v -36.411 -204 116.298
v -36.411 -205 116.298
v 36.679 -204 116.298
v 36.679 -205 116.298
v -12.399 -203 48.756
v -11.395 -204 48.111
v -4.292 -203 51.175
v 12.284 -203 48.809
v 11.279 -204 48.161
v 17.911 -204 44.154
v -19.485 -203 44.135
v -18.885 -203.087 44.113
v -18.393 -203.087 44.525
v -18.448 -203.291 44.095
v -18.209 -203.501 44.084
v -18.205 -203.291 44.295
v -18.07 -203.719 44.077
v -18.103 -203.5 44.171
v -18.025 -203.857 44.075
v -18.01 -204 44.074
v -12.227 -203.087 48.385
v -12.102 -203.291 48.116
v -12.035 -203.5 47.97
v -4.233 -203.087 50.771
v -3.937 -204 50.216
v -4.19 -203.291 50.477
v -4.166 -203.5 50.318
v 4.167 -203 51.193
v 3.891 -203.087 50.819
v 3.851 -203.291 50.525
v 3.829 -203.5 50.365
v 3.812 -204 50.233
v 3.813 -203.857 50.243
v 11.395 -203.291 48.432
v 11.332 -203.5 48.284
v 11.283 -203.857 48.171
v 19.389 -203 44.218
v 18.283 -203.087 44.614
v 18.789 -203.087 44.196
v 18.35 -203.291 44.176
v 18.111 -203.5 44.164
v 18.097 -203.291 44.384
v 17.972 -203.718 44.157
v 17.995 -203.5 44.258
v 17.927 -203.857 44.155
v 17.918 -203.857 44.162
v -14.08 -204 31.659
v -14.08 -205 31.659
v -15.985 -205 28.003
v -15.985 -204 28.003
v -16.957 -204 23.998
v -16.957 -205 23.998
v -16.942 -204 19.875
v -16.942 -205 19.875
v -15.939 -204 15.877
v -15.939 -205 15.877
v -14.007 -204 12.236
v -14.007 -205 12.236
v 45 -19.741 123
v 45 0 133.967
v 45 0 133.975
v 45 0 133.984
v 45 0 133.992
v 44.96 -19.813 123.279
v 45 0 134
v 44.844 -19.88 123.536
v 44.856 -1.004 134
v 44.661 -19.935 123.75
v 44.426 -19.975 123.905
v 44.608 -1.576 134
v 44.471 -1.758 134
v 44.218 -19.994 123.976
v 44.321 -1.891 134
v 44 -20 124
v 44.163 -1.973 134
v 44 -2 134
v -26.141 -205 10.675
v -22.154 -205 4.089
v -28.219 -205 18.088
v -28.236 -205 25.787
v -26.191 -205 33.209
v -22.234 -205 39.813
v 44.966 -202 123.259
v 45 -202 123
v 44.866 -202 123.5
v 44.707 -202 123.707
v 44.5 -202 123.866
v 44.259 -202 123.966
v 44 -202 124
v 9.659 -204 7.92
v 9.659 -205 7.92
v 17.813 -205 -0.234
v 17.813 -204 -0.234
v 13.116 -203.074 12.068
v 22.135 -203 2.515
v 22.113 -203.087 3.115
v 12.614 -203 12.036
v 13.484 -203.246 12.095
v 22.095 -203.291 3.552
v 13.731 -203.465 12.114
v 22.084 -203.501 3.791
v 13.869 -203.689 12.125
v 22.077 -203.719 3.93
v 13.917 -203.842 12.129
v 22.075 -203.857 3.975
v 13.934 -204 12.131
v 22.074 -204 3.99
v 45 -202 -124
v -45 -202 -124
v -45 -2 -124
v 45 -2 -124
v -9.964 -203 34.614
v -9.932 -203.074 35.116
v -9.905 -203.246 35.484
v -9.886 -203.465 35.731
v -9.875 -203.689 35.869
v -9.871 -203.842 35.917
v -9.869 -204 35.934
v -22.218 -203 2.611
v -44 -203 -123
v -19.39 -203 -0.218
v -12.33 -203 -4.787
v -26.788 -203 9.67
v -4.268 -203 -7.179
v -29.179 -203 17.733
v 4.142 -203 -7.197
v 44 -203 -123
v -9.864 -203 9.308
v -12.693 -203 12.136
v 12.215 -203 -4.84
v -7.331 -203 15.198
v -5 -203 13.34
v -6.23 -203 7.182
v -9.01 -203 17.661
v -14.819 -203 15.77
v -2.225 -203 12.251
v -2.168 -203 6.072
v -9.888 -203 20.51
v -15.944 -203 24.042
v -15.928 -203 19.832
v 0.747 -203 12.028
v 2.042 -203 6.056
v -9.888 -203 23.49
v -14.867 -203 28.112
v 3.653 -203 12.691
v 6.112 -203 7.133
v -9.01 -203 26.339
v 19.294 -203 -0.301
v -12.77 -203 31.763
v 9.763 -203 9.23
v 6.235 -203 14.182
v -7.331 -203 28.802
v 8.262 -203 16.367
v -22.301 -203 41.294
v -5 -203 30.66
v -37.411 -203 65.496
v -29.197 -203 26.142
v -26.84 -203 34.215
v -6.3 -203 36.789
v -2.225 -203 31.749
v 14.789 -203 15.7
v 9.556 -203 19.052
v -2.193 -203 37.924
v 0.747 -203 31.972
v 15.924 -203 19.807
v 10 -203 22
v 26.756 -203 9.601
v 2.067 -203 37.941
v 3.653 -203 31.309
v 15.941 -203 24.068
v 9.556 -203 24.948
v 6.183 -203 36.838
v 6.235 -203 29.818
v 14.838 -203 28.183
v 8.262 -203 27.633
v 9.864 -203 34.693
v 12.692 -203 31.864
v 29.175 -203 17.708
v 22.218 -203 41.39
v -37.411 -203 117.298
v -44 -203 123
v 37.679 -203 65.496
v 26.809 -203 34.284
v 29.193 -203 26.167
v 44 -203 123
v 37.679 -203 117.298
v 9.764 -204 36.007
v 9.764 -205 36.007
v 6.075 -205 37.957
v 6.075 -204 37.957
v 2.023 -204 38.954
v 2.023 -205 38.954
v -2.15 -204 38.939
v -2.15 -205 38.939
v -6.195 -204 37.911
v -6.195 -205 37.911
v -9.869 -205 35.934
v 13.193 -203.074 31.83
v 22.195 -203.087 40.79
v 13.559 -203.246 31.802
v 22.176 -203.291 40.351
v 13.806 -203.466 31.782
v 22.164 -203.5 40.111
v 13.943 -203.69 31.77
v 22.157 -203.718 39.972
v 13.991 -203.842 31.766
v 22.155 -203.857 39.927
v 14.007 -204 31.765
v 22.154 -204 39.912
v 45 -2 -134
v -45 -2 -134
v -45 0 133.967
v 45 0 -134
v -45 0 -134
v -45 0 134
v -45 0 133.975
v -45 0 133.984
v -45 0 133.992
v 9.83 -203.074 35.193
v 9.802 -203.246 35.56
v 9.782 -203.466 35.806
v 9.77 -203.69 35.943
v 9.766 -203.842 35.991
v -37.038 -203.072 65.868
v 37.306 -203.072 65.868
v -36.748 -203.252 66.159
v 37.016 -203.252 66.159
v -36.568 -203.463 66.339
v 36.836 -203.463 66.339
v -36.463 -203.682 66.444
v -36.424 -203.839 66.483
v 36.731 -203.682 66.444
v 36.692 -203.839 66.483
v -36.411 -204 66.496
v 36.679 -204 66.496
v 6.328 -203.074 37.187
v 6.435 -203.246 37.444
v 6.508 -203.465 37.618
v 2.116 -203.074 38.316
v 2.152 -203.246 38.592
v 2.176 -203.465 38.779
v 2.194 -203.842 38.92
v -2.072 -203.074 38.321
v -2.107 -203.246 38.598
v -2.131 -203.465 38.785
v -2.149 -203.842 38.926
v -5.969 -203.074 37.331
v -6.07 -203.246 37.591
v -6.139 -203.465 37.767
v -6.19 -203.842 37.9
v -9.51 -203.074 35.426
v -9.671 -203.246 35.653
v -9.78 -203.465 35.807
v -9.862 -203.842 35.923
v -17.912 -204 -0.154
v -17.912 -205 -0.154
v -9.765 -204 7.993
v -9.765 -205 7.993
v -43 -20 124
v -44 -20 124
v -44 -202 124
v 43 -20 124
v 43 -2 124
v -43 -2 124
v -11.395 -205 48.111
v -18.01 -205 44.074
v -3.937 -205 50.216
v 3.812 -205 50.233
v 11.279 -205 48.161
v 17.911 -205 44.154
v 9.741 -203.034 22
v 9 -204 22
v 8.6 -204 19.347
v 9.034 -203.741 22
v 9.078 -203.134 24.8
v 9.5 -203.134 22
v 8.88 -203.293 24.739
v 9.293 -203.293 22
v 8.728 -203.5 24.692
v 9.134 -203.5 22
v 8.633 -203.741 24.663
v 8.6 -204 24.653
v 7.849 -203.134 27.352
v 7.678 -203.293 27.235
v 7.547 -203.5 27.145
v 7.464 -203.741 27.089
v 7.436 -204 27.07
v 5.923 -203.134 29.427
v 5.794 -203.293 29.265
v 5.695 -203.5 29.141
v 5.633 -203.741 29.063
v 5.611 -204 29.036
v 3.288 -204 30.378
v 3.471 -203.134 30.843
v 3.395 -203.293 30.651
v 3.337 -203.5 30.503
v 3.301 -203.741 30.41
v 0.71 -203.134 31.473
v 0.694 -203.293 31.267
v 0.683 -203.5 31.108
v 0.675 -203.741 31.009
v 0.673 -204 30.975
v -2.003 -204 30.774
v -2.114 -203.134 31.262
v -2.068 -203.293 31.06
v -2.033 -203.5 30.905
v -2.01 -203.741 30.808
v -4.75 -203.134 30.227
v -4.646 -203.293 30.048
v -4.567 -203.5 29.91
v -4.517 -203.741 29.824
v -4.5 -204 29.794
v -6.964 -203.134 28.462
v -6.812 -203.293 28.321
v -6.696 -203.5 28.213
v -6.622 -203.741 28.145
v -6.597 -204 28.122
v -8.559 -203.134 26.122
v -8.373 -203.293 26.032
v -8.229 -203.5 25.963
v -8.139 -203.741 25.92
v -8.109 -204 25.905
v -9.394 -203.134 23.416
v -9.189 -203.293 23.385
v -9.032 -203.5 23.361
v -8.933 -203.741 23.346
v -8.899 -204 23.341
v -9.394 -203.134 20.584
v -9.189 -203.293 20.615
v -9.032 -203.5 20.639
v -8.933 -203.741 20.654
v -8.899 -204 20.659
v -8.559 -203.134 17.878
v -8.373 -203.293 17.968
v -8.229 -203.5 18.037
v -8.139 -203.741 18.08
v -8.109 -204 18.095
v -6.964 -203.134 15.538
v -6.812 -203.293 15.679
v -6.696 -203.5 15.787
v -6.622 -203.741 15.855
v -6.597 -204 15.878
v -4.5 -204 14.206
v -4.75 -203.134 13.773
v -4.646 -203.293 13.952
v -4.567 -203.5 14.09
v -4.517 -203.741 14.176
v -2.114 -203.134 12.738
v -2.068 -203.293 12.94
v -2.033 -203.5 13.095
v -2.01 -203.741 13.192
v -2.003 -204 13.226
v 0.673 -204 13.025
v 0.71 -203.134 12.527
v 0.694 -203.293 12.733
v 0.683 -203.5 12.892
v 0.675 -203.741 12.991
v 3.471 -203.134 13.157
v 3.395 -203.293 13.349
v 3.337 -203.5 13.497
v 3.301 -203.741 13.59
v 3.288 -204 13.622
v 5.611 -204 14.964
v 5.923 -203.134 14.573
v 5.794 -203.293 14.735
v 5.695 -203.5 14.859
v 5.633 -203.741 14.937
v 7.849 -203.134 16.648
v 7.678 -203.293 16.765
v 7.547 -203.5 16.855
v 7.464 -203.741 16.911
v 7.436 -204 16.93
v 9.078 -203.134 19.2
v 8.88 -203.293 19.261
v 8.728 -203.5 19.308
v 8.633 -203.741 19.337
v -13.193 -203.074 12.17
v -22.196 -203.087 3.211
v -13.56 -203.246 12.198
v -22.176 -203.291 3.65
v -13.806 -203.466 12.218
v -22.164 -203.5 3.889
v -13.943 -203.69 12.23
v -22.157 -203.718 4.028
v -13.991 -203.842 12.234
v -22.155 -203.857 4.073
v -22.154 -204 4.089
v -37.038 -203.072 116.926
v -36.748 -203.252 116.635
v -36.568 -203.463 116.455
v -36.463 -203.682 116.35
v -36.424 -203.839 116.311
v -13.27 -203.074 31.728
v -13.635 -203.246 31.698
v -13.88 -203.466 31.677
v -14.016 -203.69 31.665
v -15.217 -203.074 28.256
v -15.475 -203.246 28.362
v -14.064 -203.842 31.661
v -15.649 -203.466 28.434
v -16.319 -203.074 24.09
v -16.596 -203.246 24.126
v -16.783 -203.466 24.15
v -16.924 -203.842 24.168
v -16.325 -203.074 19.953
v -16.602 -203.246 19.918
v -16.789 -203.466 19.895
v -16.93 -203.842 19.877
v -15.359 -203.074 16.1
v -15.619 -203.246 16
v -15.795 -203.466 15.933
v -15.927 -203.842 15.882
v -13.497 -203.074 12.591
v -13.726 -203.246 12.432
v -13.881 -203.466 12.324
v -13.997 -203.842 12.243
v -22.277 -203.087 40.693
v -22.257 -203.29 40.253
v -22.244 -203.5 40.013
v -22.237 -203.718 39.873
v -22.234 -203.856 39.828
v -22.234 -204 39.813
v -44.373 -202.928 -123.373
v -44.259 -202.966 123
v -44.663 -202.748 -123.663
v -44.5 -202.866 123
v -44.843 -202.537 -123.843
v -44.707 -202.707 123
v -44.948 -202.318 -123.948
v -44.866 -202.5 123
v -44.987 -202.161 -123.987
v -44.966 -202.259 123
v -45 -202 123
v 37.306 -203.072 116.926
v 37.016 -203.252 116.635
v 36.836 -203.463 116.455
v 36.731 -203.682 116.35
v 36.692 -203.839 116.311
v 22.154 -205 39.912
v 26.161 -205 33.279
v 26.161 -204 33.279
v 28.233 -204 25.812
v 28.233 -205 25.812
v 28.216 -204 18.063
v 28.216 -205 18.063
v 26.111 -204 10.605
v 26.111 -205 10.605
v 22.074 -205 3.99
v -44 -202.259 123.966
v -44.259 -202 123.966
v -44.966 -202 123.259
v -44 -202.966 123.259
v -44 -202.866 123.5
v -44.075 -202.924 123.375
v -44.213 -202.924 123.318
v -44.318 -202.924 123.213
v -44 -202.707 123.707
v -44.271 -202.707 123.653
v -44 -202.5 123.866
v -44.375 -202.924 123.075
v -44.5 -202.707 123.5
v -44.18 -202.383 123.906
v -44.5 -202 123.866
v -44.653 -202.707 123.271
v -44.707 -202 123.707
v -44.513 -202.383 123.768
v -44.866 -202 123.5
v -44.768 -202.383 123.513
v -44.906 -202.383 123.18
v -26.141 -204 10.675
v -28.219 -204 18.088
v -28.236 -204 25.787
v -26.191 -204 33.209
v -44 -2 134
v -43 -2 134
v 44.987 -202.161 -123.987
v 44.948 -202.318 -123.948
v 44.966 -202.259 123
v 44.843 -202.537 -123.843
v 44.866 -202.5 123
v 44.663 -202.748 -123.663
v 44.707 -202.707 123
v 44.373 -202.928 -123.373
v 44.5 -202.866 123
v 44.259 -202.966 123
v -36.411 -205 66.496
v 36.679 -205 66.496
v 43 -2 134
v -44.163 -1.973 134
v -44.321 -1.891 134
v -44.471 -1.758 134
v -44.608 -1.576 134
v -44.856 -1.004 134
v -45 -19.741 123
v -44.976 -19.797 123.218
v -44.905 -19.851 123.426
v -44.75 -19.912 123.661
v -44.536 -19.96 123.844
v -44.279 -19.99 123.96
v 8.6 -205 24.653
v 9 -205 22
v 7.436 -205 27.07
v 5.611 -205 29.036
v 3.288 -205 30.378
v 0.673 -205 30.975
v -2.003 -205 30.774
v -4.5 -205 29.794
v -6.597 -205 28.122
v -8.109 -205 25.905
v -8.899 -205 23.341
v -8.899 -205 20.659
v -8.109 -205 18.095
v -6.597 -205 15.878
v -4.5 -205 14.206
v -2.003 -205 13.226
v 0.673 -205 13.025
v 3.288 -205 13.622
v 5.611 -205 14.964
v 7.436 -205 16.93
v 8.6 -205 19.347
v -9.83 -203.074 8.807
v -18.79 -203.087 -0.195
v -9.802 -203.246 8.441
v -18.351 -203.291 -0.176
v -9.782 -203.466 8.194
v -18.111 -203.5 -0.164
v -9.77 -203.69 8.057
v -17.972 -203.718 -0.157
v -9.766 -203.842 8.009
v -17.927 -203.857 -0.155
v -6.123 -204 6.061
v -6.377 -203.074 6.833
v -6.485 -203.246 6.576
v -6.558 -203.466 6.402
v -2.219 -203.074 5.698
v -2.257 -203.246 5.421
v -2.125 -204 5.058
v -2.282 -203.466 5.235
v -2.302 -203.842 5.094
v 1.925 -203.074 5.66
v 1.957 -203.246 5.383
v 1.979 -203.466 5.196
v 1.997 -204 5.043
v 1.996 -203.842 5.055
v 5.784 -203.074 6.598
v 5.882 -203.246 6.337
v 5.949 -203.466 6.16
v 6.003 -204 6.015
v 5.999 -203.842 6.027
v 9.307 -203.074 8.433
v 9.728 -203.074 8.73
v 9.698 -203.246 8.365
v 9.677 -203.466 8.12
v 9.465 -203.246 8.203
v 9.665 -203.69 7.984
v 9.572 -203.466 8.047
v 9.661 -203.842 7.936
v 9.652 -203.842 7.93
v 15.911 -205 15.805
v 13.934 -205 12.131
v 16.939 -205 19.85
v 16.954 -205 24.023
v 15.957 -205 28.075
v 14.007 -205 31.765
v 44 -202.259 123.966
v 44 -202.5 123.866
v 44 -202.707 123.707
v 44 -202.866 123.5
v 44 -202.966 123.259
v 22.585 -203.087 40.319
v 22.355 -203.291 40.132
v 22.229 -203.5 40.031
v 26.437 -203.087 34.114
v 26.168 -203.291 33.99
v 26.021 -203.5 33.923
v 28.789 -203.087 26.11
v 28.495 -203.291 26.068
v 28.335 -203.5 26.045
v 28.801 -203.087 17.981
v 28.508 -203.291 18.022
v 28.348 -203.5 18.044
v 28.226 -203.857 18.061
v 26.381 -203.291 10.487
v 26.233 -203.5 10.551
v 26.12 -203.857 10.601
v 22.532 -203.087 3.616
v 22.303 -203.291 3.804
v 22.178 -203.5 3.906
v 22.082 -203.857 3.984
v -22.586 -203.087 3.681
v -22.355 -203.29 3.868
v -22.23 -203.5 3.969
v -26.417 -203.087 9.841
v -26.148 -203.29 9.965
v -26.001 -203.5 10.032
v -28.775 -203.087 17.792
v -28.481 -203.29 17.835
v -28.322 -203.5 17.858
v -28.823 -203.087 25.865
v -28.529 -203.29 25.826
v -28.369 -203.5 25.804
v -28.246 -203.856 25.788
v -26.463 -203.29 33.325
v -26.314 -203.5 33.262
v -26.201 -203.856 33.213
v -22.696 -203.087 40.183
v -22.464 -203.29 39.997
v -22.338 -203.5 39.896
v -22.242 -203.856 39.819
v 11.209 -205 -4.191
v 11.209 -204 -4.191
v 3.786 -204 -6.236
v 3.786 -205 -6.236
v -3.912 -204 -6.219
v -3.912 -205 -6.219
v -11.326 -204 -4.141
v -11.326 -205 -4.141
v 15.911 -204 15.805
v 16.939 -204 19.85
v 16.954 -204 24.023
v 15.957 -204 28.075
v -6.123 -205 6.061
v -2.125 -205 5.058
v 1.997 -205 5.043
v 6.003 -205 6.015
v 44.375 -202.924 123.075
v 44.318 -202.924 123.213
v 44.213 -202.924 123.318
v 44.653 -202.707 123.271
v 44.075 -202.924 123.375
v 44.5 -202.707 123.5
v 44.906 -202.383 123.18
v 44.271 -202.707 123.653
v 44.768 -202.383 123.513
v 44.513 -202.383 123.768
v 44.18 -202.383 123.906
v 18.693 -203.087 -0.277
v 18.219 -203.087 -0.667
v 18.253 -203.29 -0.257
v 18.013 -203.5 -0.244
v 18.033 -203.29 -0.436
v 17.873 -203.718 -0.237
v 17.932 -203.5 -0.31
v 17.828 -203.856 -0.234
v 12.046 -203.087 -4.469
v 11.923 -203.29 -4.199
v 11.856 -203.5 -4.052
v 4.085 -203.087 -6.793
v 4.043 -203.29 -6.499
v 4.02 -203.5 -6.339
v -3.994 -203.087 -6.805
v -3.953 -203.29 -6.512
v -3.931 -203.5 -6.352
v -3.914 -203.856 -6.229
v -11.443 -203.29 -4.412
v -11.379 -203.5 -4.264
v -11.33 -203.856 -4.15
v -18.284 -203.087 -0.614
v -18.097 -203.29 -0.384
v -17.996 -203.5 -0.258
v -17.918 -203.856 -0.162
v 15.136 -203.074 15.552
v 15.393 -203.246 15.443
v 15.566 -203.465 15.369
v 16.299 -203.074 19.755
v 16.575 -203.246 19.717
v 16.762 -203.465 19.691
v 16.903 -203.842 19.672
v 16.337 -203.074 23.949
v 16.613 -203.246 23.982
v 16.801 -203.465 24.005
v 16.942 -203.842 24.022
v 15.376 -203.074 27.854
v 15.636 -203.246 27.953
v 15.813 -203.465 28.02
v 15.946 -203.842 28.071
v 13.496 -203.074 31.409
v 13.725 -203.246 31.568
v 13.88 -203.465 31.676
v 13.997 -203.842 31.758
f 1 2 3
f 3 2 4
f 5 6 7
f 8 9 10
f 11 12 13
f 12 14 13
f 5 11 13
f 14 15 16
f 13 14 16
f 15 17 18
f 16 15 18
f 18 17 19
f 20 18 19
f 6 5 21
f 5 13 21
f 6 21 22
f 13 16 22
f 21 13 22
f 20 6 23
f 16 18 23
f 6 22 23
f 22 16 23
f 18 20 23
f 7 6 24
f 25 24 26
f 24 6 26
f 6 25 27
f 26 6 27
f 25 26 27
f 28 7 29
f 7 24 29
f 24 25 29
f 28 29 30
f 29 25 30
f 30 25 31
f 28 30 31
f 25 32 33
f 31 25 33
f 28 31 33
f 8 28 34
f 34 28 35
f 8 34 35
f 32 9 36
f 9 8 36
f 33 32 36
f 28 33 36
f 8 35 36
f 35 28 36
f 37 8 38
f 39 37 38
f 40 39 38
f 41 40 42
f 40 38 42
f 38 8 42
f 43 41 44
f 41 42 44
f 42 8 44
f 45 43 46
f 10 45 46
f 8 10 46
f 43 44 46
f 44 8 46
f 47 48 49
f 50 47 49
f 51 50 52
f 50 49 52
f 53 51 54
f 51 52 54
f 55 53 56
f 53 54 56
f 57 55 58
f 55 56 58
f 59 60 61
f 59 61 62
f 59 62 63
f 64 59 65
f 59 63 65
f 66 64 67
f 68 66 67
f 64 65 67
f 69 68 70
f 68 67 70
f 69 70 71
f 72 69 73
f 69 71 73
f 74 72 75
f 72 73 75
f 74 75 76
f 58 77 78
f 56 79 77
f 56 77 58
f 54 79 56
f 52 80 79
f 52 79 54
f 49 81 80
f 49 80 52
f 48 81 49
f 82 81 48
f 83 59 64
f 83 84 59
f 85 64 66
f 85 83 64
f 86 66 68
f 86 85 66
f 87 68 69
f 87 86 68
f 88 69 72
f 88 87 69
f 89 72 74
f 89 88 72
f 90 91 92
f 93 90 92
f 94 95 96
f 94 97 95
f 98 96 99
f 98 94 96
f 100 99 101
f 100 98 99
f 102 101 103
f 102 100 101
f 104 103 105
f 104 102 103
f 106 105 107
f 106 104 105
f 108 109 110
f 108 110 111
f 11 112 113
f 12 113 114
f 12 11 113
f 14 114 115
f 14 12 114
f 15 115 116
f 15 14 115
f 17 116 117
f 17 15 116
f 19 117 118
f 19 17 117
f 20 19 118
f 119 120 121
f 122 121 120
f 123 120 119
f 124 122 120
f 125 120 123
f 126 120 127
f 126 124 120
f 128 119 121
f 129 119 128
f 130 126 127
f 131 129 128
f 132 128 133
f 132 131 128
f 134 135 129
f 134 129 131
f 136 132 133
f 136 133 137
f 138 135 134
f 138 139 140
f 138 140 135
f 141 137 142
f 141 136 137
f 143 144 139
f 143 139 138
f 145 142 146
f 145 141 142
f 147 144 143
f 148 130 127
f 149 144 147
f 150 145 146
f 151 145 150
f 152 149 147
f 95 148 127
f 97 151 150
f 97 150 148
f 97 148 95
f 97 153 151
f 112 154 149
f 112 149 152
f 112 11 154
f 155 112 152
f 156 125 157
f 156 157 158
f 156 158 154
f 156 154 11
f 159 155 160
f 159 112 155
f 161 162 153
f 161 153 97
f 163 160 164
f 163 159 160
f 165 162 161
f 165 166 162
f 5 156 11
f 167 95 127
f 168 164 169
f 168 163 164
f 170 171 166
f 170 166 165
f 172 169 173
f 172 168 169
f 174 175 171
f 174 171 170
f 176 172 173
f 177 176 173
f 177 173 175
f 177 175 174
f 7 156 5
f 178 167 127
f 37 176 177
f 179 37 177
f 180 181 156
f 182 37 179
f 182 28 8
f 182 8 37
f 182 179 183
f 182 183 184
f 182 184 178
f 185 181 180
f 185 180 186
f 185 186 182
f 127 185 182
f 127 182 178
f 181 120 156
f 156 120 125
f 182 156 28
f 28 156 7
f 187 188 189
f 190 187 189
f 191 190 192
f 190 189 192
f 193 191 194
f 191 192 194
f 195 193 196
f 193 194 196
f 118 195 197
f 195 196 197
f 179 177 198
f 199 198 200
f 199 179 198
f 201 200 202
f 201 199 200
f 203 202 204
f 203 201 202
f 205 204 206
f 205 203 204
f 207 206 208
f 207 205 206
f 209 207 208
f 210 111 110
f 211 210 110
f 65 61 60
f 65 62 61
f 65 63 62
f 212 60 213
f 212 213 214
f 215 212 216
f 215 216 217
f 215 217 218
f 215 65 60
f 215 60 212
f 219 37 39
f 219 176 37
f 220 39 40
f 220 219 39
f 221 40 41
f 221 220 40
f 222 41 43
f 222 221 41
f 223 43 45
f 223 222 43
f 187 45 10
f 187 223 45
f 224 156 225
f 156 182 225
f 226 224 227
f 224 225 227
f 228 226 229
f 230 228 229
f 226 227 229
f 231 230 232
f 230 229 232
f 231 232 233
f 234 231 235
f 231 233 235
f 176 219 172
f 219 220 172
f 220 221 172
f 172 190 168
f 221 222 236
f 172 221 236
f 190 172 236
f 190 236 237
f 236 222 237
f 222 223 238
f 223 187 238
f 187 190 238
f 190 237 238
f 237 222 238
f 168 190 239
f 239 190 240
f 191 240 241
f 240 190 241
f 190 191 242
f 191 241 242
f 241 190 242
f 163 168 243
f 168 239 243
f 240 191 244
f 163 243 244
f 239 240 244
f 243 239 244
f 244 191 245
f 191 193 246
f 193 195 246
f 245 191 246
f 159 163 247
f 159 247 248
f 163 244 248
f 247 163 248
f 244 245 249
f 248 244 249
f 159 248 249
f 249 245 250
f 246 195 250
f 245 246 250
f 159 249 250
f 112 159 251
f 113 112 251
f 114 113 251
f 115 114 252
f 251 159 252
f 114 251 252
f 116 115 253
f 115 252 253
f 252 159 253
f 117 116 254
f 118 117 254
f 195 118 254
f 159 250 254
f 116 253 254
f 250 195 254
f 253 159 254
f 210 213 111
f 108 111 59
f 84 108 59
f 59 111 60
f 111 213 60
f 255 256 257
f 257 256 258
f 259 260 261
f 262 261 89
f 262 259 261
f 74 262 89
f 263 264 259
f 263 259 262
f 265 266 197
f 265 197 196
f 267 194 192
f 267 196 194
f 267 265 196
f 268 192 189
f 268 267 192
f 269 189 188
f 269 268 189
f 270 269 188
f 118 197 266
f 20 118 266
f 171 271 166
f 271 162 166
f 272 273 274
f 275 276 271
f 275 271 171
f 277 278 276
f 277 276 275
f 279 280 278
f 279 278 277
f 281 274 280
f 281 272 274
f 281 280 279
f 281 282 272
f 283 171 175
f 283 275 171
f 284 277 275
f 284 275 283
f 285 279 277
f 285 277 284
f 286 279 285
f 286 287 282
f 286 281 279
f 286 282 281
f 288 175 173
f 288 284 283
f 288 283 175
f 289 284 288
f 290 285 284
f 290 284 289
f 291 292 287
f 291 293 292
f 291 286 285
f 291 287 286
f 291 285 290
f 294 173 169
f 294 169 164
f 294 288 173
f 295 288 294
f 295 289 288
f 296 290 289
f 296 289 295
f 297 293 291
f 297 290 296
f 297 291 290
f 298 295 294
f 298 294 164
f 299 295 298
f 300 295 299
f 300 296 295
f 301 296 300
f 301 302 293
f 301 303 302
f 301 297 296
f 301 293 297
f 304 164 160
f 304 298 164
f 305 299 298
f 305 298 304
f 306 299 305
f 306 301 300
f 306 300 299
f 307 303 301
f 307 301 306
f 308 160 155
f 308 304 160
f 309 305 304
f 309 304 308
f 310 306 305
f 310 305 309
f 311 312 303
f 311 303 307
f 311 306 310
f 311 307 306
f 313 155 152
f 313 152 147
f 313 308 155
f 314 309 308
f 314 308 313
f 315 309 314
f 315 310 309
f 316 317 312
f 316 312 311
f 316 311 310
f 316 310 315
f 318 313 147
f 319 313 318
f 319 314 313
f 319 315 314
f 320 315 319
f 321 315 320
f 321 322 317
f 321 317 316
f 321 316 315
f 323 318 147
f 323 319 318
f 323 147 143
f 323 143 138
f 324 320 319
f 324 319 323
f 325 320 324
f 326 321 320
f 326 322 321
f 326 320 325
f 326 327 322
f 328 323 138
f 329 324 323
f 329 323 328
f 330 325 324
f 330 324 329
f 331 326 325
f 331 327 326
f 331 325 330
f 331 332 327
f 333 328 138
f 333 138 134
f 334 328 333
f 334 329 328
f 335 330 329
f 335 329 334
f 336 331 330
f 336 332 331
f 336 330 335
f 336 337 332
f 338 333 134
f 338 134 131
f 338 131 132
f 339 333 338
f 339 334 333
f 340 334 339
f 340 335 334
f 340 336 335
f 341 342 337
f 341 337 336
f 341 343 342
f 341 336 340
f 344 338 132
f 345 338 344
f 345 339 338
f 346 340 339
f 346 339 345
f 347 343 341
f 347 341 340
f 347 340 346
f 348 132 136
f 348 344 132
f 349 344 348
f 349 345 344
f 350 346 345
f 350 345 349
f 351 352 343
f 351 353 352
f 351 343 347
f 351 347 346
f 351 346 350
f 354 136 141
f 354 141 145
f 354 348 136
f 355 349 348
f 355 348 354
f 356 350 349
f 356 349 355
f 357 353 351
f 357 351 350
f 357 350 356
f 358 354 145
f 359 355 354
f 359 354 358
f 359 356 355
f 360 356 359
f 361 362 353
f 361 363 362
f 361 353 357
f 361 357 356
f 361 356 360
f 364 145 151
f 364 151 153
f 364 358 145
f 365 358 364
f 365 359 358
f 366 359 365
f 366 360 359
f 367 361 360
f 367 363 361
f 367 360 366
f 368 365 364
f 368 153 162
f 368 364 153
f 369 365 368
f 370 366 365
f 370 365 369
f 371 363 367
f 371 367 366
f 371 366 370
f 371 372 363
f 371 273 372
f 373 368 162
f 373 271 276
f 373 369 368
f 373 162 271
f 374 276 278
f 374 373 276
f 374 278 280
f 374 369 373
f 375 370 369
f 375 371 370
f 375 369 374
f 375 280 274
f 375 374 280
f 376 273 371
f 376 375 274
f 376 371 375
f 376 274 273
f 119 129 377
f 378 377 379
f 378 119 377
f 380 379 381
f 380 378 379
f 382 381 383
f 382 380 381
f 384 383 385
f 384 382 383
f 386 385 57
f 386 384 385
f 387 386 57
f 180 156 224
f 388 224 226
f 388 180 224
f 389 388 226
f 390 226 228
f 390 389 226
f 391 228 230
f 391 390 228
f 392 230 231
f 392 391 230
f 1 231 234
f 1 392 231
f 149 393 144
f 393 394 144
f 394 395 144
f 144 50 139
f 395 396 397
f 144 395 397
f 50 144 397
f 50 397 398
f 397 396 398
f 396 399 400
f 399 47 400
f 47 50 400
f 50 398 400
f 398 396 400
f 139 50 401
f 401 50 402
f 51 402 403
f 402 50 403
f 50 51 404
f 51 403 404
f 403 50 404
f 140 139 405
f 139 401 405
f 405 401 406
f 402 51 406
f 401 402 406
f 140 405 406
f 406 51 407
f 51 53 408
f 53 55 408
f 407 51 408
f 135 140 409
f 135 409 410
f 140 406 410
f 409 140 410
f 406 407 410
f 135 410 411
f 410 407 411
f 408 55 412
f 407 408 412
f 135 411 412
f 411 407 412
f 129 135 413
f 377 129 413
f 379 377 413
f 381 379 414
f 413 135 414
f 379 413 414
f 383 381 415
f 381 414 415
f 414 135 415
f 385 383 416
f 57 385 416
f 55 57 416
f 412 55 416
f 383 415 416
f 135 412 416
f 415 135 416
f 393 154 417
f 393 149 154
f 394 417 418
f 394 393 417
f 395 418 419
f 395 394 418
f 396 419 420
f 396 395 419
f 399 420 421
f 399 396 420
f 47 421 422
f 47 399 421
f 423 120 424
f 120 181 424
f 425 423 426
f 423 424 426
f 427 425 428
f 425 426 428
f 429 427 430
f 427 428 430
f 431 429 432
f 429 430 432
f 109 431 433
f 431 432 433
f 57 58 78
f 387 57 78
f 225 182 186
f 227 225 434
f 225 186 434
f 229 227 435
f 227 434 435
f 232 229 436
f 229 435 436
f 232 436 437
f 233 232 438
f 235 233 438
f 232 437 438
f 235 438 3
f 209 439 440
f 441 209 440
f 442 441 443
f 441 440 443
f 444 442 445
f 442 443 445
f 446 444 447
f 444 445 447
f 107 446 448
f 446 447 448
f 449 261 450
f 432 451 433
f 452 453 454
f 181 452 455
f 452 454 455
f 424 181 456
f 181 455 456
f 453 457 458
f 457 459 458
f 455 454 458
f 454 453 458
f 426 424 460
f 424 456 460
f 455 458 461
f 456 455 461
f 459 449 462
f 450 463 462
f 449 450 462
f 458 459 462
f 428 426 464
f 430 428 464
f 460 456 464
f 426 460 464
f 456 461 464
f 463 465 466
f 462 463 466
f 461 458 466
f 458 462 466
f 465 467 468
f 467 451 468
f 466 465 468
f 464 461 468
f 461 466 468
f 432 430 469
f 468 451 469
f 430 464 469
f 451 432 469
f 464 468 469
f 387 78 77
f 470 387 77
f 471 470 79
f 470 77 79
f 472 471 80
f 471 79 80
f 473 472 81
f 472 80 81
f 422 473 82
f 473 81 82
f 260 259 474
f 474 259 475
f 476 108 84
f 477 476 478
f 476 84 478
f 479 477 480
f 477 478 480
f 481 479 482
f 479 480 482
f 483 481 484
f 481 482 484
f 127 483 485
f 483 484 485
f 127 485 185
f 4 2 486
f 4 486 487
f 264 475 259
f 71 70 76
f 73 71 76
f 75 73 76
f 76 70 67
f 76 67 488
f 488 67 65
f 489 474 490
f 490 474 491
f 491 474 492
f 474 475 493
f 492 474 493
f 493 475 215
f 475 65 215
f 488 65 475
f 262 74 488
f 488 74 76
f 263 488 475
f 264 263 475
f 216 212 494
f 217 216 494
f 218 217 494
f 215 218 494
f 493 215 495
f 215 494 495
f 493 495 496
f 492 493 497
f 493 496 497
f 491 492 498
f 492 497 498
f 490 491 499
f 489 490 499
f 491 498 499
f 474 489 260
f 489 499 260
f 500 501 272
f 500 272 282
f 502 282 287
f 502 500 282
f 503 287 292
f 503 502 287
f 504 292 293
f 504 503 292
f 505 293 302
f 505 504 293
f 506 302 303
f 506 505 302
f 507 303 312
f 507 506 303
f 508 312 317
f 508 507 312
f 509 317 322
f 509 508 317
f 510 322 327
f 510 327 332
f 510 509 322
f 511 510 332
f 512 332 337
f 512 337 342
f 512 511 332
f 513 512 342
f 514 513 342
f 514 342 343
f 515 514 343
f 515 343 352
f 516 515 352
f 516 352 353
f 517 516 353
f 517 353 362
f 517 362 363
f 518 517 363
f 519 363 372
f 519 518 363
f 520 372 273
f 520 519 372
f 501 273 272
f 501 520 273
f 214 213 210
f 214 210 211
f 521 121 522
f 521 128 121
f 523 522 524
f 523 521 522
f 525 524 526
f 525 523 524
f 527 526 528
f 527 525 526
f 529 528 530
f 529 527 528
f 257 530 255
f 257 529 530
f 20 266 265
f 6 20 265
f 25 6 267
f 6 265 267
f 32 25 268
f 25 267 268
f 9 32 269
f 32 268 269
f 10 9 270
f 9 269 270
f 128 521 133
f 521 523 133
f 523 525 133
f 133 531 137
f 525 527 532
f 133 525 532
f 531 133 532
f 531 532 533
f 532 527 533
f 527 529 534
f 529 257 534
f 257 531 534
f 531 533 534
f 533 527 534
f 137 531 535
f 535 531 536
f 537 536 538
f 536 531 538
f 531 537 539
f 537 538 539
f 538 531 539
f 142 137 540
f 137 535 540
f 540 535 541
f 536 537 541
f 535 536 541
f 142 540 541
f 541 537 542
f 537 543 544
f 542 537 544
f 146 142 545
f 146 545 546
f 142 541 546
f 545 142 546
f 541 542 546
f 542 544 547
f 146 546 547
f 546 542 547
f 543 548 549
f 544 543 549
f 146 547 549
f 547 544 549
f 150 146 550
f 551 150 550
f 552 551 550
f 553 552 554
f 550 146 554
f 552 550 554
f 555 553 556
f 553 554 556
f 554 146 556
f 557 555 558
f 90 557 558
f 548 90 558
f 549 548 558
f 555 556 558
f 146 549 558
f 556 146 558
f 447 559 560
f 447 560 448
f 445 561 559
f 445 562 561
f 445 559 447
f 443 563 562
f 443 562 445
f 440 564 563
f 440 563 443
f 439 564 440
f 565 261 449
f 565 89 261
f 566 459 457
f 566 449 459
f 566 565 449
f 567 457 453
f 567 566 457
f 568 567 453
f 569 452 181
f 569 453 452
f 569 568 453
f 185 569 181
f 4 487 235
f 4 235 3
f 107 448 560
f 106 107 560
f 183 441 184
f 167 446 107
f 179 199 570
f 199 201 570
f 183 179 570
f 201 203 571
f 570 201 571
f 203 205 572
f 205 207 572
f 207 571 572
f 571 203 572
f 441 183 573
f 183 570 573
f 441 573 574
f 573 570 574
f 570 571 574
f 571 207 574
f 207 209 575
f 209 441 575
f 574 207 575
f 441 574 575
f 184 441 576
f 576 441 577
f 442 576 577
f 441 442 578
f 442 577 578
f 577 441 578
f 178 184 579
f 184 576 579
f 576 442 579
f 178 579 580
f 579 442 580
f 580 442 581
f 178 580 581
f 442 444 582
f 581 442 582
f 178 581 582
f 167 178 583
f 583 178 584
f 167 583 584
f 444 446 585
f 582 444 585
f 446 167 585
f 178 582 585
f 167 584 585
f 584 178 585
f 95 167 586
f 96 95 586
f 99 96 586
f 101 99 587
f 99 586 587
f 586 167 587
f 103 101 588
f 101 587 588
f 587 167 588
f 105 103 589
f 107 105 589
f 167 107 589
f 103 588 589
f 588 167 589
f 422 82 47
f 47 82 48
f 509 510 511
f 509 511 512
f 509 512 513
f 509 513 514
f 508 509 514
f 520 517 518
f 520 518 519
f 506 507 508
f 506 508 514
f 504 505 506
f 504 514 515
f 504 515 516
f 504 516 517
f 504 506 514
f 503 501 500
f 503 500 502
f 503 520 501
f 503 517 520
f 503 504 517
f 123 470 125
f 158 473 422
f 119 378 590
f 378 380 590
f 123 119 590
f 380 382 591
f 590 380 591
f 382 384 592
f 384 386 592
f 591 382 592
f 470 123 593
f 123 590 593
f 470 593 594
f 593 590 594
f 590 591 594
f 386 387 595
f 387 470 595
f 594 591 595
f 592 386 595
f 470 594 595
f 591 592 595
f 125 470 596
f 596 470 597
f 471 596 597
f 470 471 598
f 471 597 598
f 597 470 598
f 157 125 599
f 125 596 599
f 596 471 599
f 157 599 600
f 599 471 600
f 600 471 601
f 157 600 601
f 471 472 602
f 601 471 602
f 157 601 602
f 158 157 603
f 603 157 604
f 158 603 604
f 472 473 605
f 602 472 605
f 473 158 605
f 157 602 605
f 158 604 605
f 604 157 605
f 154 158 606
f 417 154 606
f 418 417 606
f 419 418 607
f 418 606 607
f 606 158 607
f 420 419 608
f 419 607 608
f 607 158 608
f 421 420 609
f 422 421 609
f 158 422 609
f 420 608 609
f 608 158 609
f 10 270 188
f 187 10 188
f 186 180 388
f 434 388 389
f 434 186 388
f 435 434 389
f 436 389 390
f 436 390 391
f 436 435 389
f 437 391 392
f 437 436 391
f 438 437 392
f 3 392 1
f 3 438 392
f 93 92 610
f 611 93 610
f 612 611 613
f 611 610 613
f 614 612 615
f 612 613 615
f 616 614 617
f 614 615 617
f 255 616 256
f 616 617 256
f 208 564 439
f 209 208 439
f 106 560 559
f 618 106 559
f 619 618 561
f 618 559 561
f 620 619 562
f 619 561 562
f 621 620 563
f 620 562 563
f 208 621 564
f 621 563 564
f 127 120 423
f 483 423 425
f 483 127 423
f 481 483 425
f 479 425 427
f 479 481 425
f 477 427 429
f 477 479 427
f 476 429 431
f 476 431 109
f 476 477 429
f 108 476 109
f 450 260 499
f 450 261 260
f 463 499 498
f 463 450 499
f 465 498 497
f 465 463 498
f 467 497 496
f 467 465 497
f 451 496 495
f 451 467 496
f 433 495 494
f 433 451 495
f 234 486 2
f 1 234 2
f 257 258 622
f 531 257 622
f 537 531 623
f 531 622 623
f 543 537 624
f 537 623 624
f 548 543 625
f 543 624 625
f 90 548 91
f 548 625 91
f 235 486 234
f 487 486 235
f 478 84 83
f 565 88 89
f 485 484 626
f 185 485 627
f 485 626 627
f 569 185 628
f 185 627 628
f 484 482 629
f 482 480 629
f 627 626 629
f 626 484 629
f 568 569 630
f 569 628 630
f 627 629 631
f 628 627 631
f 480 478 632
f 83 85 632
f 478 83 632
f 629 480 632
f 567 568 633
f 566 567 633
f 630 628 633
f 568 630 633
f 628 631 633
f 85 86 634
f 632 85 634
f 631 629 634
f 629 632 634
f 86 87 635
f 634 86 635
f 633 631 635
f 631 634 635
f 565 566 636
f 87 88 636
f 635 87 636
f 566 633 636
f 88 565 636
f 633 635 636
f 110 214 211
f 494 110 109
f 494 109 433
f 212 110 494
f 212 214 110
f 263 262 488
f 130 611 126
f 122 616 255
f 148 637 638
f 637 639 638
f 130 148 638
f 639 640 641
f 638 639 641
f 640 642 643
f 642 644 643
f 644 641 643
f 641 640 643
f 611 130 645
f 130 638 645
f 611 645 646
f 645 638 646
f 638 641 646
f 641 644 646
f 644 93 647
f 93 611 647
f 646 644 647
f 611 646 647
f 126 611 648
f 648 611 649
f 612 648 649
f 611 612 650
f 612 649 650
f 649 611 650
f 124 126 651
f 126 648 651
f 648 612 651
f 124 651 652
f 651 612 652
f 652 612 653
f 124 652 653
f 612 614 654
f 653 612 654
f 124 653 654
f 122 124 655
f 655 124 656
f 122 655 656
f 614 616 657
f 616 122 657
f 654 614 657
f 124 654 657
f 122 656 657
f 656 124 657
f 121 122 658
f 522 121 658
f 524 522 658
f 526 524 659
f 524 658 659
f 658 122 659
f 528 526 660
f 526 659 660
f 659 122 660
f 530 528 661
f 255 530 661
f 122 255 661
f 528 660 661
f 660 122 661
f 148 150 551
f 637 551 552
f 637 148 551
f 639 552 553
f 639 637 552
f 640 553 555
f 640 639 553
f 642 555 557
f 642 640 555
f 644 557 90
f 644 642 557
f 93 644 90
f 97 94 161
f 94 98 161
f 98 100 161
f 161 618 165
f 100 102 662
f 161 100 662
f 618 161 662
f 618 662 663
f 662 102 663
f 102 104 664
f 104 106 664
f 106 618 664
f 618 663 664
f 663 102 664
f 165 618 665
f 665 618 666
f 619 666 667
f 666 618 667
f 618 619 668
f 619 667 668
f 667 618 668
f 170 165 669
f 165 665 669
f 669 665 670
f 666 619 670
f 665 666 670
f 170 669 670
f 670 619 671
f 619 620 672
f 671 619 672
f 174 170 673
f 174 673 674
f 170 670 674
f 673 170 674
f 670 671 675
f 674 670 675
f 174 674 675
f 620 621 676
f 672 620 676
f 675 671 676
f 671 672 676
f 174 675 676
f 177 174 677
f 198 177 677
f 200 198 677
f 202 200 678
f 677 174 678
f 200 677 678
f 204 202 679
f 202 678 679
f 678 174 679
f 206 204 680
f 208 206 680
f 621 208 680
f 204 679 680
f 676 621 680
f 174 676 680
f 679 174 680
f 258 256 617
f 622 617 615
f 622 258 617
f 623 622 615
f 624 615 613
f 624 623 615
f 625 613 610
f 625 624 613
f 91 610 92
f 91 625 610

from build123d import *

# Parameters (mm, degrees)
F0_W      = 90
F0_H      = 248
F1_DEPTH  = 205
F2_W      = 90
F2_H      = 248
F2_R      = 9
F2_W_2    = 73.0899348855
F2_H_2    = 49.802608788
F3_DEPTH  = 2
F4_W      = 90
F4_H      = 10
F5_DEPTH  = 20
F7_DEPTH  = 10
F9_DEPTH  = 90.001
F10_R     = 1
F11_DEPTH = 18


with BuildPart() as f1:
    # F0 (on Front) → F1 (new body)
    with BuildSketch(Plane.XZ):
        Rectangle(F0_W, F0_H)
    extrude(amount=F1_DEPTH)

    # F2 (on face) → F3 (cut)
    with BuildSketch(Plane.XZ.offset(205)):
        Rectangle(F2_W, F2_H)
        with BuildLine():
            ThreePointArc((-22.1542112523, 4.0888261413), (-28.4888623982, 21.9367015102), (-22.2335868368, 39.8125508039))
            Line((-22.2335868368, 39.8125508039), (-14.0800879143, 31.6590518814))
            ThreePointArc((-14.0800879143, 31.6590518814), (-17.0746019847, 21.9360306146), (-14.0073171141, 12.2357202795))
            Line((-14.0073171141, 12.2357202795), (-22.1542112523, 4.0888261413))
        make_face(mode=Mode.SUBTRACT)
        with BuildLine():
            Line((9.659050138, 7.9199138292), (17.8125490605, -0.2335850934))
            ThreePointArc((17.8125490605, -0.2335850934), (-0.0635810751, -6.4888600293), (-17.9116123889, -0.1538563696))
            Line((-17.9116123889, -0.1538563696), (-9.7647469179, 7.9930091015))
            ThreePointArc((-9.7647469179, 7.9930091015), (-0.0642548211, 4.9254008239), (9.659050138, 7.9199138292))
        make_face(mode=Mode.SUBTRACT)
        with BuildLine():
            ThreePointArc((-18.0098373075, 44.0740826489), (-0.0635511695, 50.4888635829), (17.9111756021, 44.1542129957))
            Line((17.9111756021, 44.1542129957), (9.7642814639, 36.0073188576))
            ThreePointArc((9.7642814639, 36.0073188576), (-0.0641690046, 39.0746029857), (-9.8692875132, 35.9335328546))
            Line((-9.8692875132, 35.9335328546), (-18.0098373075, 44.0740826489))
        make_face(mode=Mode.SUBTRACT)
        with Locations((0, 22.0000017434)):
            Circle(F2_R, mode=Mode.SUBTRACT)
        with BuildLine():
            ThreePointArc((22.153858113, 39.9116141324), (28.4888624646, 21.9367314157), (22.0740809054, 3.990164436))
            Line((22.0740809054, 3.990164436), (13.9335311111, 12.1307142303))
            ThreePointArc((13.9335311111, 12.1307142303), (17.074602306, 21.936116431), (14.006992642, 31.7647486613))
            Line((14.006992642, 31.7647486613), (22.153858113, 39.9116141324))
        make_face(mode=Mode.SUBTRACT)
        with Locations((0.1340024173, 91.3970731199)):
            Rectangle(F2_W_2, F2_H_2, mode=Mode.SUBTRACT)
    extrude(amount=-F3_DEPTH, mode=Mode.SUBTRACT)

    # F4 (on face) → F5 (join)
    with BuildSketch(Plane(origin=(0, 0, 0), x_dir=(-1, 0, 0), z_dir=(0, 1, 0))):
        with Locations((0, 129)):
            Rectangle(F4_W, F4_H)
        with Locations((0, -129)):
            Rectangle(F4_W, F4_H)
    extrude(amount=-F5_DEPTH)

    # F6 (on face) → F7 (cut, through all)
    with BuildSketch(Plane.XY.offset(134)):
        Polygon((43, -2), (-43, -2), (-43, -20), (43, -20), (43, -18), align=None)
    extrude(amount=-F7_DEPTH, mode=Mode.SUBTRACT)

    # F8 (on face) → F9 (cut, through all)
    with BuildSketch(Plane.YZ.offset(45)):
        Polygon((-20, 134), (-20, 124), (-2, 134), align=None)
    extrude(amount=-F9_DEPTH, mode=Mode.SUBTRACT)

    # F10
    f10_edges = [f1.edges().sort_by_distance(p)[0] for p in [
        (-45, -111.5, 124),
        (-45, -11, 129),
        (45, -11, 129),
        (45, -111.5, 124),
        (0, -203, -124),
        (45, -203, 0),
        (0, -203, 124),
        (-45, -203, 0),
        (-18.156837, -203, 35.735801),
        (-17.074602, -203, 21.936031),
        (-18.080764, -203, 8.162273),
        (-28.488862, -203, 21.936702),
        (-0.064255, -203, 4.925401),
        (13.7358, -203, 3.843164),
        (-0.063581, -203, -6.48886),
        (-13.83818, -203, 3.919576),
        (-0.064169, -203, 39.074603),
        (-13.939562, -203, 40.003808),
        (-0.063551, -203, 50.488864),
        (13.837729, -203, 40.080766),
        (-9, -203, 22.000002),
        (28.488862, -203, 21.936731),
        (18.003806, -203, 8.060439),
        (17.074602, -203, 21.936116),
        (18.080425, -203, 35.838181),
        (-36.410965, -203, 91.397073),
        (0.134002, -203, 116.298378),
        (36.67897, -203, 91.397073),
        (0.134002, -203, 66.495769),
    ]]
    fillet(f10_edges, radius=F10_R)

    # F11 (cut): a face of the model
    f11_faces = [f1.faces().sort_by_distance(p)[0] for p in [
        (0, -20, -129),
    ]]
    extrude(f11_faces, amount=-F11_DEPTH, mode=Mode.SUBTRACT)


solid = f1.part
